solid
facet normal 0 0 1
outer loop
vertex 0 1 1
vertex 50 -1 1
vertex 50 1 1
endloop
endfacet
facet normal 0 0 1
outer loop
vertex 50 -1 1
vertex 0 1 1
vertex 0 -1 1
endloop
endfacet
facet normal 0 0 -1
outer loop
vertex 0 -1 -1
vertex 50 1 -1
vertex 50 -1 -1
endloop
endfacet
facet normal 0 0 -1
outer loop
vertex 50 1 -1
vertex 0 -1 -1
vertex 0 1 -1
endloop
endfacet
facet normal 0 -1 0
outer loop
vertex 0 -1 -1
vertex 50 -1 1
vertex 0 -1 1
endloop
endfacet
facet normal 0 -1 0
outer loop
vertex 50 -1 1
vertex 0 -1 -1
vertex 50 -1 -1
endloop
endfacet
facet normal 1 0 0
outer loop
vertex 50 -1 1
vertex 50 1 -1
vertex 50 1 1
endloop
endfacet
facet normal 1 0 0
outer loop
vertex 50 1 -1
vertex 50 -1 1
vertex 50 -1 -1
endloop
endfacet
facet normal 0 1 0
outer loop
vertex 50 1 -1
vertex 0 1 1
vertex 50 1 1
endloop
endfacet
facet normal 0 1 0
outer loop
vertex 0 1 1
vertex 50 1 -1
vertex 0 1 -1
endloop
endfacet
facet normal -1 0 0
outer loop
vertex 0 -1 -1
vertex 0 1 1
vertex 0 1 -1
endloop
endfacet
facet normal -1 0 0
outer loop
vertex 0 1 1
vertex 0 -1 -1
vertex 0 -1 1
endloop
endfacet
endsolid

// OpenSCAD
boneSkeleton();

module boneSkeleton(leg_length = 50, bone_size = 2) {
    translate([0, -bone_size / 2, -bone_size / 2])
        color("Gainsboro")
            cube([leg_length, bone_size, bone_size], center = false);
}
